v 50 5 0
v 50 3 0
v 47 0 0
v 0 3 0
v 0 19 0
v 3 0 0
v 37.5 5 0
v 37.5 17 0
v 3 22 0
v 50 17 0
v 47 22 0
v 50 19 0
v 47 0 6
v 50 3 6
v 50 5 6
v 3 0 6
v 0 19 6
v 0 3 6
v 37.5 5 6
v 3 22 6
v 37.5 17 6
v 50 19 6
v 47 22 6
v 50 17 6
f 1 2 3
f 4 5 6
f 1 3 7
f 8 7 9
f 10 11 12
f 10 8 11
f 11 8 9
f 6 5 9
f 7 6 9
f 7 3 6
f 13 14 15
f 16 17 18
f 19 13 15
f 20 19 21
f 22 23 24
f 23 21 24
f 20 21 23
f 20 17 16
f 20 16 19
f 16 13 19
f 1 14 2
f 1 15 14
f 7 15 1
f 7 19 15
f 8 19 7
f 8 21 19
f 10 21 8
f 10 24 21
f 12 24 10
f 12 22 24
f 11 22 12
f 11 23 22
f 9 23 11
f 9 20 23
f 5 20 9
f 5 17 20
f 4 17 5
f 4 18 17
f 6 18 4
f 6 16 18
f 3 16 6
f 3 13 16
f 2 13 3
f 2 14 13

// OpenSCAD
$fn = 32;

// ----------------------------------------------------------------------
// C washer: 50 x 22 mm plate with an open slot
// ----------------------------------------------------------------------

// --- parameters (mm) ---
profile_height = 6;       // extrusion height
profile_points = 12;      // points of the closed outline

profile = [[3, 0], [47, 0], [50, 3], [50, 5], [37.5, 5], [37.5, 17], [50, 17], [50, 19], [47, 22], [3, 22], [0, 19], [0, 3]];  // single closed polygon, 12 points, counter clockwise

// --- the one profile operation ---
linear_extrude(height = profile_height) polygon(points = profile);
